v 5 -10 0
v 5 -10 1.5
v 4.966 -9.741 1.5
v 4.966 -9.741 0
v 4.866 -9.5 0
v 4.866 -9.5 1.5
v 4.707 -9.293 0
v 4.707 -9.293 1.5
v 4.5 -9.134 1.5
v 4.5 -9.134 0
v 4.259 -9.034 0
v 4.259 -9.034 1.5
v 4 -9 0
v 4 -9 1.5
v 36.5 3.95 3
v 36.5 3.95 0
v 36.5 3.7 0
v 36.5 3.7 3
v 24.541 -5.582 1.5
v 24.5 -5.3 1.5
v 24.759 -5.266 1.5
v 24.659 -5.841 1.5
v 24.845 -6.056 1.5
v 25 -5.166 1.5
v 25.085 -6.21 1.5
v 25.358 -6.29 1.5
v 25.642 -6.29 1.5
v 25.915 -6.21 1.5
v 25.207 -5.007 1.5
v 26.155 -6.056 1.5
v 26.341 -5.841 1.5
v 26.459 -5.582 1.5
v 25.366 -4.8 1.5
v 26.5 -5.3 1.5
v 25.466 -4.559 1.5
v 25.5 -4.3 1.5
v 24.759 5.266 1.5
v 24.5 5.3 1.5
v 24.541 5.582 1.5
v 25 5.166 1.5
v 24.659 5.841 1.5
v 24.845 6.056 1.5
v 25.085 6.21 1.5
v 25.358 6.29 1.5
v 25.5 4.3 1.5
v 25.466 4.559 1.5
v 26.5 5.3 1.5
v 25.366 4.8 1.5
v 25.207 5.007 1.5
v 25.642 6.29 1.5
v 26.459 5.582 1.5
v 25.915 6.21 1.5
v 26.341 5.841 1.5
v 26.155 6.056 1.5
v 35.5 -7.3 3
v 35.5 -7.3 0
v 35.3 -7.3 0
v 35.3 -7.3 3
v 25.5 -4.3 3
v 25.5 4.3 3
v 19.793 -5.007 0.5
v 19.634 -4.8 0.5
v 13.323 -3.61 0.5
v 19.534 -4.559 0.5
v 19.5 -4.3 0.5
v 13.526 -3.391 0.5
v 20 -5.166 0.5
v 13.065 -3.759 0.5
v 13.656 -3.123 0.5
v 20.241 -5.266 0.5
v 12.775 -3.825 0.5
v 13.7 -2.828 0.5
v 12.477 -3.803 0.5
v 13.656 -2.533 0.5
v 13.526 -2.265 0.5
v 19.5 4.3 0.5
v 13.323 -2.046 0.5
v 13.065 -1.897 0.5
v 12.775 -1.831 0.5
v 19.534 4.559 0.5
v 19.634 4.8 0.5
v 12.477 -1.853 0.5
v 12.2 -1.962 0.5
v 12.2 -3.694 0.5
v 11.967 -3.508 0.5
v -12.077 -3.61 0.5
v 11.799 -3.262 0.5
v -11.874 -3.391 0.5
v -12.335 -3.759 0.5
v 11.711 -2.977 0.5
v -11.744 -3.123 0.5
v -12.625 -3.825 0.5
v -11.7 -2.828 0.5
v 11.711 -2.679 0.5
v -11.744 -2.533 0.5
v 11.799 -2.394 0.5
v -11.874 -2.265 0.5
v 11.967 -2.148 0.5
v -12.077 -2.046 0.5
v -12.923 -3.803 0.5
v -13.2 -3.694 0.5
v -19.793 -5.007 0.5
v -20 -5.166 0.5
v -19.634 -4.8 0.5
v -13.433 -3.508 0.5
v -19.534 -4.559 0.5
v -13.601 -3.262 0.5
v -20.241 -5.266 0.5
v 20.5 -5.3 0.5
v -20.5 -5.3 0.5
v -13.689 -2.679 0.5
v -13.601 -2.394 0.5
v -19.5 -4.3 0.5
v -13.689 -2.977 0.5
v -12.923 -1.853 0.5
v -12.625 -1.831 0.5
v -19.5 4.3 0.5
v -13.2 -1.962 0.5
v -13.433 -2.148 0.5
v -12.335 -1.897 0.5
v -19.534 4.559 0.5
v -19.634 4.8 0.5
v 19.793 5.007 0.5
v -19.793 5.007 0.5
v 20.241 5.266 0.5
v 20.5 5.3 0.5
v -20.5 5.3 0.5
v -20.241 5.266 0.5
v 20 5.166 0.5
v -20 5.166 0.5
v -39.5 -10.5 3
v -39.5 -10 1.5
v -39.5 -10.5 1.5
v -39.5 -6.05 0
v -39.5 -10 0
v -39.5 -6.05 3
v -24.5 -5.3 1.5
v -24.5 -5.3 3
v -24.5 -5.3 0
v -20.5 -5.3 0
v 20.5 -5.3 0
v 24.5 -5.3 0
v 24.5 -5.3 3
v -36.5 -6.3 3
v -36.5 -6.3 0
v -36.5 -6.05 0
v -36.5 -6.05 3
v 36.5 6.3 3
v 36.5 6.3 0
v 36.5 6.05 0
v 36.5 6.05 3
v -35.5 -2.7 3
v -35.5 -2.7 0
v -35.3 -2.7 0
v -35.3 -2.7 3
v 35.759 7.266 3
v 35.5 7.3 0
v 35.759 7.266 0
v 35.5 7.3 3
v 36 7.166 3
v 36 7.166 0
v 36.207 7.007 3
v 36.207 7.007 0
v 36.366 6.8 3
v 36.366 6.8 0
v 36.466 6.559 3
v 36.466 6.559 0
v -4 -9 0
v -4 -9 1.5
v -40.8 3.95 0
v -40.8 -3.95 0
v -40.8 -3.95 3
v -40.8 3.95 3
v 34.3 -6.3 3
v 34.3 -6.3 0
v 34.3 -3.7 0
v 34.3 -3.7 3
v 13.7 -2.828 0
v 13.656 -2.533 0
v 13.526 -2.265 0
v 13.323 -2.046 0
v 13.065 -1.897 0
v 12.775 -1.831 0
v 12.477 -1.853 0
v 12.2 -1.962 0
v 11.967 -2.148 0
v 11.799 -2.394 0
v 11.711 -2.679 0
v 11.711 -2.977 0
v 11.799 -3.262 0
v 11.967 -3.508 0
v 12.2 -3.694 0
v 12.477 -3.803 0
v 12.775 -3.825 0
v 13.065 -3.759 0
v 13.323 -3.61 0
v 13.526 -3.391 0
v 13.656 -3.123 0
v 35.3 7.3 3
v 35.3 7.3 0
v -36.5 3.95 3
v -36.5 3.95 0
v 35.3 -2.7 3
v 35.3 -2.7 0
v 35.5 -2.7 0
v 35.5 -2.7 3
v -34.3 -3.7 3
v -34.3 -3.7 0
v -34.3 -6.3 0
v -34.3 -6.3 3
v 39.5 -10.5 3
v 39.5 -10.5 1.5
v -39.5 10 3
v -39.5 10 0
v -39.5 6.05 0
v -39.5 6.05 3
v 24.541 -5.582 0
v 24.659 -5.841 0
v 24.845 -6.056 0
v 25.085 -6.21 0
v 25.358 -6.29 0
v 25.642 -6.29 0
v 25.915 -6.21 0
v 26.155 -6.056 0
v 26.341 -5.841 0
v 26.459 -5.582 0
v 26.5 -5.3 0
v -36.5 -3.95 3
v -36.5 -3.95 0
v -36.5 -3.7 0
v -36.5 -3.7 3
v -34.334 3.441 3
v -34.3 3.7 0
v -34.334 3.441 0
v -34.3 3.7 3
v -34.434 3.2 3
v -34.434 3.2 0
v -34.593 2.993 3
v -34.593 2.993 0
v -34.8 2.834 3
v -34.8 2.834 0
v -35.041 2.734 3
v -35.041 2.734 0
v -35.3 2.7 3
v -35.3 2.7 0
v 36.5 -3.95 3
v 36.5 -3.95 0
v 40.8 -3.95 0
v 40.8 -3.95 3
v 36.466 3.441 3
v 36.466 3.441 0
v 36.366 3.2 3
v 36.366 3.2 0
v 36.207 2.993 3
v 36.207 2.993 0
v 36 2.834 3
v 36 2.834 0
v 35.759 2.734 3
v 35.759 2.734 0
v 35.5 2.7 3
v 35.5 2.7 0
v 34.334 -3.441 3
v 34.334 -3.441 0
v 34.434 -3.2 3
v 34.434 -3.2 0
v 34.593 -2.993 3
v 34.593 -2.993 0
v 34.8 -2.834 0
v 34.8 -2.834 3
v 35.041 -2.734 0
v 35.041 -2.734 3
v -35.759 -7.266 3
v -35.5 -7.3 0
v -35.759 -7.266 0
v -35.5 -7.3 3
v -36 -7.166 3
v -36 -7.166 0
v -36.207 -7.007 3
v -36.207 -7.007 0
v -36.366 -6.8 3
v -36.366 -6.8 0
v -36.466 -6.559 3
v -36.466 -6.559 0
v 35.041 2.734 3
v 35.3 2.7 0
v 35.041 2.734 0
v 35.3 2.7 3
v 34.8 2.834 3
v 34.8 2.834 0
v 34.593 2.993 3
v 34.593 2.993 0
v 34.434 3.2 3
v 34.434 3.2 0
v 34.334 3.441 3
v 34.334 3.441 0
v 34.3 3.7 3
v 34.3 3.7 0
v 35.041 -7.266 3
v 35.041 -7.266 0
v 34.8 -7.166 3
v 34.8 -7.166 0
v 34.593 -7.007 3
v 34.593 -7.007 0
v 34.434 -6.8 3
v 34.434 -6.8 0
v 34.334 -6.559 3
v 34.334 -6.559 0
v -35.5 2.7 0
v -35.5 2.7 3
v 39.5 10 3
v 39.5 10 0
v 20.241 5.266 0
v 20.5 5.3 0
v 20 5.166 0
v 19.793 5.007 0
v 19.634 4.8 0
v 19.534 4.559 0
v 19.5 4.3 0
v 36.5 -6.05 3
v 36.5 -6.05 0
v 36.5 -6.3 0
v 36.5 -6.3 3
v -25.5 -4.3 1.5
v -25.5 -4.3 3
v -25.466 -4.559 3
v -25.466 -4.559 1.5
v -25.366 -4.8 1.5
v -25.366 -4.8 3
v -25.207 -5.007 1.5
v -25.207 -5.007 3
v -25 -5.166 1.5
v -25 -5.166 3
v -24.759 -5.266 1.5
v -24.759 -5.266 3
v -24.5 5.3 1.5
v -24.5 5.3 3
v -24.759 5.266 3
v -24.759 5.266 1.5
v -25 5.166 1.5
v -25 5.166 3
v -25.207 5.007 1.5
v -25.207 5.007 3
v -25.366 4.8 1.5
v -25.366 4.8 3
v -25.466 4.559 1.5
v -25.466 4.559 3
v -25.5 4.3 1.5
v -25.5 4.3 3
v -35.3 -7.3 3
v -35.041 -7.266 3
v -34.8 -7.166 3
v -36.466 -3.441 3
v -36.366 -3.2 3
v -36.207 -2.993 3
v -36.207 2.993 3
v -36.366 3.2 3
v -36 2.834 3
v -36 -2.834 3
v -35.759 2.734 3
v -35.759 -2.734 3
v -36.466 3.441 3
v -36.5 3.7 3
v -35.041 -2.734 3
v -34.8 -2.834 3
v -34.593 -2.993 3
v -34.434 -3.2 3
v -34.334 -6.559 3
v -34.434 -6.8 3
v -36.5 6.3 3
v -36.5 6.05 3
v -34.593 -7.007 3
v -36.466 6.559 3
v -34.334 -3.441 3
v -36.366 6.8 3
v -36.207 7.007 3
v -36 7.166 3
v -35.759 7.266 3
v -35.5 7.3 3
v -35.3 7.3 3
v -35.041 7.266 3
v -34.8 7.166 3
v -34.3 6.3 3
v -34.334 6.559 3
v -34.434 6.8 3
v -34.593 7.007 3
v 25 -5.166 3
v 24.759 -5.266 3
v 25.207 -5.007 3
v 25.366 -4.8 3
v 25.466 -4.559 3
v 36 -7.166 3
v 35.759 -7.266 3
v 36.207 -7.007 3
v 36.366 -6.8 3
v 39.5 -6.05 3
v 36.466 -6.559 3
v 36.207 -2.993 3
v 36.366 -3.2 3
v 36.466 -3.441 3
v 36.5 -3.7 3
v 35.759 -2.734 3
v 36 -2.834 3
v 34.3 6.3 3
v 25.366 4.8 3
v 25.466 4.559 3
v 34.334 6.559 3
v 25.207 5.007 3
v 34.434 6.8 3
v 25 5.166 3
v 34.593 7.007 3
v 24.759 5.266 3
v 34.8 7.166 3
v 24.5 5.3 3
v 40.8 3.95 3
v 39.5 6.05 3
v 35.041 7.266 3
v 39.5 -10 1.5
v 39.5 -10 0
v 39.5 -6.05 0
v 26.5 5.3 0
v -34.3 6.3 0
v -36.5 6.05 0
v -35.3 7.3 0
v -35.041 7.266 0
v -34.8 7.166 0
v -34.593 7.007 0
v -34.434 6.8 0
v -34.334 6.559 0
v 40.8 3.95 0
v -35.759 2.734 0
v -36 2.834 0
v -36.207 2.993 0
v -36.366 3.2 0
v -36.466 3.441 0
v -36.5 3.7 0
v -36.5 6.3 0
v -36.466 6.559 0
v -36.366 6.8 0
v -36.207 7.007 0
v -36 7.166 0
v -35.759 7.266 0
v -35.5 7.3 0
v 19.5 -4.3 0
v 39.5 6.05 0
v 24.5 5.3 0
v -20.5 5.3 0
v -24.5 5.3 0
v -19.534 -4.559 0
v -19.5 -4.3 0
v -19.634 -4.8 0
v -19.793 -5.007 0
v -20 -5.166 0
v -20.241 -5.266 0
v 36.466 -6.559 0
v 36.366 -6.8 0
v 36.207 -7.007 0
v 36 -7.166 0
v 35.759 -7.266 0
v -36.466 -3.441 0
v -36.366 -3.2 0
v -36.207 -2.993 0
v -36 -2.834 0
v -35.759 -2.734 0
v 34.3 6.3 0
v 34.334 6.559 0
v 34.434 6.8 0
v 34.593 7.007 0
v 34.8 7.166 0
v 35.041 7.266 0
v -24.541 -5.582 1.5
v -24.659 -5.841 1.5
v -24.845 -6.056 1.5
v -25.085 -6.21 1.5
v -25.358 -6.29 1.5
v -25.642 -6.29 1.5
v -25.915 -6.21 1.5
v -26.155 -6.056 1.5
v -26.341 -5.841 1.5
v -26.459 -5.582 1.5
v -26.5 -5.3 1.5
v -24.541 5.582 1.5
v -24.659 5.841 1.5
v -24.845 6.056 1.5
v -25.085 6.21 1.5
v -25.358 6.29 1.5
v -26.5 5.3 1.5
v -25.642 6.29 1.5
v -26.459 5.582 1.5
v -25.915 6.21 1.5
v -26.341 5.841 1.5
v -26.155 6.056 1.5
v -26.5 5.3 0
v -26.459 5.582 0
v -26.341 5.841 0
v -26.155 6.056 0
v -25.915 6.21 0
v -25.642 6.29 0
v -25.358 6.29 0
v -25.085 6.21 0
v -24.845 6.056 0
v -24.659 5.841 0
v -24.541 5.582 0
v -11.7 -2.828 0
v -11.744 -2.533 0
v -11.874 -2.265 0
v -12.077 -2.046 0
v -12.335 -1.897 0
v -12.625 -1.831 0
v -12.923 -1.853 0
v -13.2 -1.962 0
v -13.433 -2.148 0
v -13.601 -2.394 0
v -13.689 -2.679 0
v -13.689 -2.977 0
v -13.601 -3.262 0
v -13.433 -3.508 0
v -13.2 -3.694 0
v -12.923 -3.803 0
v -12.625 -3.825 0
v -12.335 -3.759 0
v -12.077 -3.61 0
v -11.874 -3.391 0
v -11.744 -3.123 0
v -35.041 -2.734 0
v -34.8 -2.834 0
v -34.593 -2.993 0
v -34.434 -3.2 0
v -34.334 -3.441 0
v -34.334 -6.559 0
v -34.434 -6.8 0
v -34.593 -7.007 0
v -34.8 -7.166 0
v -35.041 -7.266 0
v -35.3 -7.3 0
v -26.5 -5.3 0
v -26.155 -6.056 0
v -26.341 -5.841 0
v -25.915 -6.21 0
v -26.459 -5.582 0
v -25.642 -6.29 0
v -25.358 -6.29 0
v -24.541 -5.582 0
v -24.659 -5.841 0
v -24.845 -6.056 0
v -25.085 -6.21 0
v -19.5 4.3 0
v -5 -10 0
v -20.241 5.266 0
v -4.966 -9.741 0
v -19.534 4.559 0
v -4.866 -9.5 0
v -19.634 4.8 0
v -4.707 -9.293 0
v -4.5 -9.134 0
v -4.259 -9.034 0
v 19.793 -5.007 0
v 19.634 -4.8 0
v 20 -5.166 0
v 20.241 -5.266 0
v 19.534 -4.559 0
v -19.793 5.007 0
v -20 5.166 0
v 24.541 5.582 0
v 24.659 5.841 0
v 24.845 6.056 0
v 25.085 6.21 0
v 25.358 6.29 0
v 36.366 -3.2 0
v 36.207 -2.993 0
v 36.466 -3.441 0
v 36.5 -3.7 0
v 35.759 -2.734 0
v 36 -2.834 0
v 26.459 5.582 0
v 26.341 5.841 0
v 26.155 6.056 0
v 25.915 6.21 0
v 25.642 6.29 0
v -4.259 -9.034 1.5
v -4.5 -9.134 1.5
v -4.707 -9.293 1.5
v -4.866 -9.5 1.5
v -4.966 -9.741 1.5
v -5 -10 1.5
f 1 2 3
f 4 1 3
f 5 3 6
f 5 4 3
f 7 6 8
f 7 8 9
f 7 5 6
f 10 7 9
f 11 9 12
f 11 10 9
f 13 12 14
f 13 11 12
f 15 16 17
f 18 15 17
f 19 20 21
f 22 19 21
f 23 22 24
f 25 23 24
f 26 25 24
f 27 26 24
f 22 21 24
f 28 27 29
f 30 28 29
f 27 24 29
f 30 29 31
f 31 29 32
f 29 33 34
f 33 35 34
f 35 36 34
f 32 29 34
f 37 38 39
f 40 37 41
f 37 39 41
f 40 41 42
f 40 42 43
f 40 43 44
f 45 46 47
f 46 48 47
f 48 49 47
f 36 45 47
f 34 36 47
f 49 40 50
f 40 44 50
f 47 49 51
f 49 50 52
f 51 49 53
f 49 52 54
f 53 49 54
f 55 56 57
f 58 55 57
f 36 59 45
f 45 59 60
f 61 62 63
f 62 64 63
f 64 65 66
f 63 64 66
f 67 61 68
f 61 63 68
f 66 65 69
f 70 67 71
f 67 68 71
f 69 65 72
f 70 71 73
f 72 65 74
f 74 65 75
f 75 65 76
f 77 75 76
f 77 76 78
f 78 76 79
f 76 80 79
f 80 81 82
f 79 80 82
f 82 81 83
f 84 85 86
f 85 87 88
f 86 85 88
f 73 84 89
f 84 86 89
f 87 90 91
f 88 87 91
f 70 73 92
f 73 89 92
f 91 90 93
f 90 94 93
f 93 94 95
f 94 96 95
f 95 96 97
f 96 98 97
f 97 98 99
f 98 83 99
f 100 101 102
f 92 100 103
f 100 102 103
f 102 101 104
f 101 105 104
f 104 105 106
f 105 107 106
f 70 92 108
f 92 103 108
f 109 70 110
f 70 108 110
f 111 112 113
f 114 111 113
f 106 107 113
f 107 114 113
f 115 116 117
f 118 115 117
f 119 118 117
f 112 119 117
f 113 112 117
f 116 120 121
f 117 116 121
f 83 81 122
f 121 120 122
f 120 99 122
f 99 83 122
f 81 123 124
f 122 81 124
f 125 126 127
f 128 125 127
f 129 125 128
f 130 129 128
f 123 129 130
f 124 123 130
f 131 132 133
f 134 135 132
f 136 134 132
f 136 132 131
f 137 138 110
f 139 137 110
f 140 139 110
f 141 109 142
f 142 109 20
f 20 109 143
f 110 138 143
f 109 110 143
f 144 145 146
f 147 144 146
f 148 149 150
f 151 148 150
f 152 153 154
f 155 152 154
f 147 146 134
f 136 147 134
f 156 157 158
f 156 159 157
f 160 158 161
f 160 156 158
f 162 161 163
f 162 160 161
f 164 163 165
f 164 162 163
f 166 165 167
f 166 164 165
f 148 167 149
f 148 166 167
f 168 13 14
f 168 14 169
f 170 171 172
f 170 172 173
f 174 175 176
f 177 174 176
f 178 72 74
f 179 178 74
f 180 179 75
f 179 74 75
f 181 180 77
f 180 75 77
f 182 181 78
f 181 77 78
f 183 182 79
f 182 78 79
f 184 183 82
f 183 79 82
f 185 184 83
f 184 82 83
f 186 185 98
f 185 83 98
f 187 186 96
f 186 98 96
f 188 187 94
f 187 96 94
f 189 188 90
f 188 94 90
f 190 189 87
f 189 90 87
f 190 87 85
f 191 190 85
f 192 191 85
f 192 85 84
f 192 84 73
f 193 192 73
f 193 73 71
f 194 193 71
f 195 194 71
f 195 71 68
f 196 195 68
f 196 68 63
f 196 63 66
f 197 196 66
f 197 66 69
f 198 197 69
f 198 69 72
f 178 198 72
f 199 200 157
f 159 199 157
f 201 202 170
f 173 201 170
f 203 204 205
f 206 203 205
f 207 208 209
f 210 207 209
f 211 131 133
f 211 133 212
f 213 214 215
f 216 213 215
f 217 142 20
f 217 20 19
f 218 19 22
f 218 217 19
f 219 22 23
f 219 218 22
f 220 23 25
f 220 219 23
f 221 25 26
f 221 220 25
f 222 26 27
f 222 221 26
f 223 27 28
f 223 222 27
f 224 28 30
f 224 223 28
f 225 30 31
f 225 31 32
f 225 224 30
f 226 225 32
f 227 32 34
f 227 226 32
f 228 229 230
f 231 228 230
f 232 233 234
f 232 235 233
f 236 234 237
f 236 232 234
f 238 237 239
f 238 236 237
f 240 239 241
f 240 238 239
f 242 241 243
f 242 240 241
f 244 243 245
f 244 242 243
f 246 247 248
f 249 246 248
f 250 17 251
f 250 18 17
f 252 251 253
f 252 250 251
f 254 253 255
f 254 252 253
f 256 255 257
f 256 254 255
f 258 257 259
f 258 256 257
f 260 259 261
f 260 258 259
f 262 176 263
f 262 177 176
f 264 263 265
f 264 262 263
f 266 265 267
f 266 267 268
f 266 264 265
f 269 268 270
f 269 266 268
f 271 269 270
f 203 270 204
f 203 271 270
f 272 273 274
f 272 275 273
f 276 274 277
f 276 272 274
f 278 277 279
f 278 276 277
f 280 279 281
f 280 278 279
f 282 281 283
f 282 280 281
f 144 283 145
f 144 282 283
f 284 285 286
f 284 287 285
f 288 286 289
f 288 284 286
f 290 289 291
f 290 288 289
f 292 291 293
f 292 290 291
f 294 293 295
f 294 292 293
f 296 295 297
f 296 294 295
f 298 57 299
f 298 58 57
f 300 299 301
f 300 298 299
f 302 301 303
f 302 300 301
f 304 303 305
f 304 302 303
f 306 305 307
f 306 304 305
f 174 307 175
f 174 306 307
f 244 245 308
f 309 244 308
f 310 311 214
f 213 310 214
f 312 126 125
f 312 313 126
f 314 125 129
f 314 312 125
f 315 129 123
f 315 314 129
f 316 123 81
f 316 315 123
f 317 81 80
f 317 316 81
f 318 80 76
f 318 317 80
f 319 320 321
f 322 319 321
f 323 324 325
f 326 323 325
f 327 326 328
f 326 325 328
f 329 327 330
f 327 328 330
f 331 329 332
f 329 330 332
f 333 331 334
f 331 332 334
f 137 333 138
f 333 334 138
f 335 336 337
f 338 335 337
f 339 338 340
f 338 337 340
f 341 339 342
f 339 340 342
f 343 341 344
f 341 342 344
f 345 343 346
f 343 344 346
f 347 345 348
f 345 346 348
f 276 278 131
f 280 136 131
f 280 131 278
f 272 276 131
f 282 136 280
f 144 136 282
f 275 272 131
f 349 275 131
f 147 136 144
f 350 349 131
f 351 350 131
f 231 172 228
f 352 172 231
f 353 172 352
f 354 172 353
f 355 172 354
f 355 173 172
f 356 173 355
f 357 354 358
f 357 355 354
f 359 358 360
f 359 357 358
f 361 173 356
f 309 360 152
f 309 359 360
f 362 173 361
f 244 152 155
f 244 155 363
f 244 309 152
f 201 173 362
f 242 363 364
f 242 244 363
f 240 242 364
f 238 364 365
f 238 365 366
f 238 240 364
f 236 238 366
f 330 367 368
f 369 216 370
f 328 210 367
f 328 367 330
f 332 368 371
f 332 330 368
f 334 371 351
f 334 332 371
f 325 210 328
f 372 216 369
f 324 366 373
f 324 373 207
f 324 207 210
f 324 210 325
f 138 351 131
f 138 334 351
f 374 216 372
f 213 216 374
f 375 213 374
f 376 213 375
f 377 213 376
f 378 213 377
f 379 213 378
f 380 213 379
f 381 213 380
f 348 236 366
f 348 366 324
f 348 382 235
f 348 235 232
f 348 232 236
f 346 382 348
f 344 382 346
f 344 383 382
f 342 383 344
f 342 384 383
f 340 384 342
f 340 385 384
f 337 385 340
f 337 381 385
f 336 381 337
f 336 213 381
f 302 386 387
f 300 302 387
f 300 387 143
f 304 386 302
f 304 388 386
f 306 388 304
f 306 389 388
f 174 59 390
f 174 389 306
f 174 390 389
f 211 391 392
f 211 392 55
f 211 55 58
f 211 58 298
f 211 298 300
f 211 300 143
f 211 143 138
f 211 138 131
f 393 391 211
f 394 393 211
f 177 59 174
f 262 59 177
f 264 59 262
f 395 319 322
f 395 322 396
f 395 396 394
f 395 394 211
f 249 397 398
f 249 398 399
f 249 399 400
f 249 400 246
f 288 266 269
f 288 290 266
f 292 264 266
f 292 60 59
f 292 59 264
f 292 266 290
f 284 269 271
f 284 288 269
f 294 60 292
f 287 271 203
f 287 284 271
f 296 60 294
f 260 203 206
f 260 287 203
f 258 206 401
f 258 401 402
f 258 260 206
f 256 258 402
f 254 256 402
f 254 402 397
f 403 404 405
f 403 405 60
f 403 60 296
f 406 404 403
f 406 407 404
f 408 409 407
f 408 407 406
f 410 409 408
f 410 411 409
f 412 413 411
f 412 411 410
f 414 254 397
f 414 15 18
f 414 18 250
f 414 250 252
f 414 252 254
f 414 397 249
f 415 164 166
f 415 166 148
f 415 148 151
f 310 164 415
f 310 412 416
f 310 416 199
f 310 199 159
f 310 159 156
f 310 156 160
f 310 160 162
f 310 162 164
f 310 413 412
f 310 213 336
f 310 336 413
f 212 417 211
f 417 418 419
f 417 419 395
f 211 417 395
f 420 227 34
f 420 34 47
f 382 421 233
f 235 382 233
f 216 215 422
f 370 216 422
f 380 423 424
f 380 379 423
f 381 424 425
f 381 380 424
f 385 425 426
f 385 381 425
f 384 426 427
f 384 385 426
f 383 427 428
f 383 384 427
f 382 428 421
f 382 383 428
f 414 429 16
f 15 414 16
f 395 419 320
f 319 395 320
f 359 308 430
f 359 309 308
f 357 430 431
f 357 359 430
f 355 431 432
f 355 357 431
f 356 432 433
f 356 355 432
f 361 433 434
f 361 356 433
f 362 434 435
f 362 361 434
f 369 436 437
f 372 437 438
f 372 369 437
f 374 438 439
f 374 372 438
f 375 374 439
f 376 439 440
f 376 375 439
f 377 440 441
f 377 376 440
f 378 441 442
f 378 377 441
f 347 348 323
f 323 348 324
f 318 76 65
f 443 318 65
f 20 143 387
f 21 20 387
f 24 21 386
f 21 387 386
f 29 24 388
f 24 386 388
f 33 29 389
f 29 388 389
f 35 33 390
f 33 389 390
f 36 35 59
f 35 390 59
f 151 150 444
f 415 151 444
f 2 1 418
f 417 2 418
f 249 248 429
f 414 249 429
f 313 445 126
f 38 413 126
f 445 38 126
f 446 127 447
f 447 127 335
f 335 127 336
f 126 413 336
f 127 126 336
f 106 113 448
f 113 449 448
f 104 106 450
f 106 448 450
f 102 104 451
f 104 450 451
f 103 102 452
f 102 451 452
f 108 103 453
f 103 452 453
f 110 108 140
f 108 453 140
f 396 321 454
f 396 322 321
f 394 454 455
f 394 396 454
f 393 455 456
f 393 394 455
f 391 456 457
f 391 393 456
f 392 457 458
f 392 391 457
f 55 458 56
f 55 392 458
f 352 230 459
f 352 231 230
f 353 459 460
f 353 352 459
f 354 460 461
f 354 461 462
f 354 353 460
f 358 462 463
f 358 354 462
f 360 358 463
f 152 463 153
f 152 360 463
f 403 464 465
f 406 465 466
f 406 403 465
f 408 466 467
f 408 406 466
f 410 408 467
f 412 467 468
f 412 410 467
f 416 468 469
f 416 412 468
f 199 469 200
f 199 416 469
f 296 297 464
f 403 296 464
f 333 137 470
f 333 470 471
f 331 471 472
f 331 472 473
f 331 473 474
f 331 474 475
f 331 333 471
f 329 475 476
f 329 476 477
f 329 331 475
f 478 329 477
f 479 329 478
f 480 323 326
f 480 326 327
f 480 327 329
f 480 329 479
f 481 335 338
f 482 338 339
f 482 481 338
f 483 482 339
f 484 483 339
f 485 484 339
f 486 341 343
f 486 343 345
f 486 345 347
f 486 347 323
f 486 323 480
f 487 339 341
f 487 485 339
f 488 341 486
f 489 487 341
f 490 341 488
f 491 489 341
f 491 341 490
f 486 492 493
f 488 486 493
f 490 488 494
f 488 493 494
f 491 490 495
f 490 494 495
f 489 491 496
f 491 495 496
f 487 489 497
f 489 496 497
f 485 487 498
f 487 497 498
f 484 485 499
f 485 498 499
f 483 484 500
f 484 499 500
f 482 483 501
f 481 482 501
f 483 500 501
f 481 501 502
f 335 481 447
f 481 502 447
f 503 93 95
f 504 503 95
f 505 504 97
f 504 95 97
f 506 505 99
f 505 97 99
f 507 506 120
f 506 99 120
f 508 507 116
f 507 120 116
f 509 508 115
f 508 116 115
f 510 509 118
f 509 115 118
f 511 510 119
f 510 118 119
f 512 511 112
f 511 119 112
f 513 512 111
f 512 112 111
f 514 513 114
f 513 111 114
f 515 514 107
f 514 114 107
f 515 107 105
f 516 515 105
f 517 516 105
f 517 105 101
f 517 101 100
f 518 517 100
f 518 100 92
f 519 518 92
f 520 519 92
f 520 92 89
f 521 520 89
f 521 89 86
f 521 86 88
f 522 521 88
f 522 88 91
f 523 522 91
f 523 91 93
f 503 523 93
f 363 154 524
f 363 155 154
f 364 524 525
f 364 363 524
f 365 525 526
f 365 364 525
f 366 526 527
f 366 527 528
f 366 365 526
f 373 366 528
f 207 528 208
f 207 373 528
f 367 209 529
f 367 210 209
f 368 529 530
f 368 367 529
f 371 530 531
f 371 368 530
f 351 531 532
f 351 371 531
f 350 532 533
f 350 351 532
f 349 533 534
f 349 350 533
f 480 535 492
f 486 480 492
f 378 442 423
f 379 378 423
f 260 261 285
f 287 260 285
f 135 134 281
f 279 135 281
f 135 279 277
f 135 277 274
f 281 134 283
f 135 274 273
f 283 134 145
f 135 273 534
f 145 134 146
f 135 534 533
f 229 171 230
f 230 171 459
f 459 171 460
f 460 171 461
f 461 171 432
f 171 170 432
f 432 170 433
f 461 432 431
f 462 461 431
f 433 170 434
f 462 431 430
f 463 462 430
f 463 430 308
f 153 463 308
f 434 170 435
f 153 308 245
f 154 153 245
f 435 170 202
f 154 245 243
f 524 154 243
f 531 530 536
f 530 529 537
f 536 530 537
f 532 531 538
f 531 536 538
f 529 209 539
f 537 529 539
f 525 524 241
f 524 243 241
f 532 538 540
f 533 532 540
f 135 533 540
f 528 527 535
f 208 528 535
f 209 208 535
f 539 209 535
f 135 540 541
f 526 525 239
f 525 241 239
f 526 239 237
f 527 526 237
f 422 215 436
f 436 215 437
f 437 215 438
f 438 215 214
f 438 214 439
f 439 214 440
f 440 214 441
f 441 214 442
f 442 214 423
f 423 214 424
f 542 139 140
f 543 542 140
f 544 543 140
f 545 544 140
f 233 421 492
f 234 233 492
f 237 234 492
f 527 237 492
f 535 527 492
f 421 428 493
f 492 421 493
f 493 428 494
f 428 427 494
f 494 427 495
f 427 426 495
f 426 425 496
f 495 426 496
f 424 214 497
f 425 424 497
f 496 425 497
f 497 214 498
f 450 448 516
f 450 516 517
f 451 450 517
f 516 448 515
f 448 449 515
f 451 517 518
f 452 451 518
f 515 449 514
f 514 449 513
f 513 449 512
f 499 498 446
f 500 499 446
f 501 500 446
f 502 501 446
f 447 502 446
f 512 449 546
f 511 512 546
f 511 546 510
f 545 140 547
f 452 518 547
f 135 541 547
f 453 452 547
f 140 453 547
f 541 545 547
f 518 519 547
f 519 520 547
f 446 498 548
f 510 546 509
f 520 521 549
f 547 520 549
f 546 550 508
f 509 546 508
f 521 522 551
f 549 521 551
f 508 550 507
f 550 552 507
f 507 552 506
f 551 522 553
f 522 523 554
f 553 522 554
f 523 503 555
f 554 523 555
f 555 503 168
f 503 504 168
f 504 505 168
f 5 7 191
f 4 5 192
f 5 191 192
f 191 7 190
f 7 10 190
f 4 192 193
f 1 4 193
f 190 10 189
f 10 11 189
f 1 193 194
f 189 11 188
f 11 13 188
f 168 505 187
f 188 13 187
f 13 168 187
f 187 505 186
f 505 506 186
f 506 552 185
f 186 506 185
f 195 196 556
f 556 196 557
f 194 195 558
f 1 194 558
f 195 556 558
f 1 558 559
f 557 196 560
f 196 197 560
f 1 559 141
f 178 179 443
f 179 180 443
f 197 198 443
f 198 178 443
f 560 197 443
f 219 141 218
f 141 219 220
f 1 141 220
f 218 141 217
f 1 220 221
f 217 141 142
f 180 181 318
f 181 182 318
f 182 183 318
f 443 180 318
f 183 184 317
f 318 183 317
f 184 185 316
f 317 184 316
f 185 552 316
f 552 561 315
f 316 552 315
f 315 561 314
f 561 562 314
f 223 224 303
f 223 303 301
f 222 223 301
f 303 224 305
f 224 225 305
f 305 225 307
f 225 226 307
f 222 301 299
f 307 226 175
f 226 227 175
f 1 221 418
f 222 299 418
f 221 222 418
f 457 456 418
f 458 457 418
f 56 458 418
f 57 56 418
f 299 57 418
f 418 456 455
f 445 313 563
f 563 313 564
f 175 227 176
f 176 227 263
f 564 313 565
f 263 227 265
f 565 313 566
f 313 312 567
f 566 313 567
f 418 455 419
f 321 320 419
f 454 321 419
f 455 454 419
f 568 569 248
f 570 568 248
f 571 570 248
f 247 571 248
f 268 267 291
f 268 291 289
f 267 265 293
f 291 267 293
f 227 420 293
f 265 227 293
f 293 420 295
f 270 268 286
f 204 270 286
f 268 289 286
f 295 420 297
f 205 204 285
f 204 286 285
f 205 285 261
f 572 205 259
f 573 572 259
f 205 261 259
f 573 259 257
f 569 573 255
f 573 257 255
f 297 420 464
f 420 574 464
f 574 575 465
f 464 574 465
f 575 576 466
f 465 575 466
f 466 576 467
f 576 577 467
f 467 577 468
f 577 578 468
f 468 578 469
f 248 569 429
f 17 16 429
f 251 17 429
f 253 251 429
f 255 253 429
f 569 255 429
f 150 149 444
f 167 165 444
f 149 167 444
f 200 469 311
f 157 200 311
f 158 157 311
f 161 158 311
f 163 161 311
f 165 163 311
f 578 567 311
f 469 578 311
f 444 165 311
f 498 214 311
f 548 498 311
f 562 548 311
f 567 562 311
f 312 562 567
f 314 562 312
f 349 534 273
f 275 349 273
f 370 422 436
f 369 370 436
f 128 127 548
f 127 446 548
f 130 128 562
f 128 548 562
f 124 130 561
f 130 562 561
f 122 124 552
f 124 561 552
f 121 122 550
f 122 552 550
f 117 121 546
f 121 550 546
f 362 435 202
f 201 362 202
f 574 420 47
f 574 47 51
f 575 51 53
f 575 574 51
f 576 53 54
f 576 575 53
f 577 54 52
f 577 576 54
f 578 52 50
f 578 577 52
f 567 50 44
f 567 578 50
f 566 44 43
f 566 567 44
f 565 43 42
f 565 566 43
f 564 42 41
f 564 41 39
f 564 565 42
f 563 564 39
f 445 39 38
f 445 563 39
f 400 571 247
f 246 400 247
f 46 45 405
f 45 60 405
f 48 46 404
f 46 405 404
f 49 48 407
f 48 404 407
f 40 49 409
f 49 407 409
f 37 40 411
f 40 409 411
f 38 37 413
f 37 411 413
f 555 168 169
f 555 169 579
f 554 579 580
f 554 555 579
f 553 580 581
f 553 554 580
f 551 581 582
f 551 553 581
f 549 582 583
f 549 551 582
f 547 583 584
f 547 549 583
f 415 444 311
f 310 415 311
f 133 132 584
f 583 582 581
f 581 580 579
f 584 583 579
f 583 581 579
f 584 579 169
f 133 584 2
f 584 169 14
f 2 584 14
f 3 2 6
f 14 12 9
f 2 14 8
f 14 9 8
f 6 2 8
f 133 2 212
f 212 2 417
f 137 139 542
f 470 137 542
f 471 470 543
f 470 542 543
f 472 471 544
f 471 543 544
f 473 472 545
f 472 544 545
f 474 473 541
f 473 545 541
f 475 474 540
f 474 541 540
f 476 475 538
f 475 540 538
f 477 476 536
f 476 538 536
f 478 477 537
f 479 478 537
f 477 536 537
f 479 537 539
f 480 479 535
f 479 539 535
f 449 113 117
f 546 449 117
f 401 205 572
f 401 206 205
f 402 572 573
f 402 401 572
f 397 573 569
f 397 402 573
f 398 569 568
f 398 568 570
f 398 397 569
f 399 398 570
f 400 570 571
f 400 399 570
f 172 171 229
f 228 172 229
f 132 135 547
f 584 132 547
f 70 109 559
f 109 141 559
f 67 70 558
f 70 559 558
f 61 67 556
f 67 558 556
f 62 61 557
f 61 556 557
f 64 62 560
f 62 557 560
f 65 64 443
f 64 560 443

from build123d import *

# Parameters (mm, degrees)
SKETCH1_W                          = 1.3
SKETCH1_H                          = 7.9
BASE_SHAPE_DEPTH                   = 3
SKETCH4_W                          = 79
SKETCH4_H                          = 1.5
FLOOR_LIP_DEPTH                    = 0.5
NAIL_CUTOUT_DEPTH                  = 1.5
MILL_FILLETS_R                     = 1
LED_STRIP_POCKET_DEPTH             = 2.5
LED_STRIP_CUTS_REACH               = 2.5
SKETCH9_R                          = 1
LED_STRIP_CUT_FILLETS_R            = 1
LED_PCB_PADS_CLEARANCE_SLOTS_DEPTH = 1.5


with BuildPart() as part:
    # Sketch1 → Base shape (new body)
    with BuildSketch(Plane.XY):
        Polygon((39.5, 10), (-39.5, 10), (-39.5, 6.05), (-36.5, 6.05), (-36.5, 7.3), (-34.3, 7.3), (-34.3, 2.7), (-36.5, 2.7), (-36.5, 3.95), (-39.5, 3.95), (-39.5, -3.95), (-36.5, -3.95), (-36.5, -2.7), (-34.3, -2.7), (-34.3, -7.3), (-36.5, -7.3), (-36.5, -6.05), (-39.5, -6.05), (-39.5, -10), (39.5, -10), (39.5, -6.05), (36.5, -6.05), (36.5, -7.3), (34.3, -7.3), (34.3, -2.7), (36.5, -2.7), (36.5, -3.95), (39.5, -3.95), (39.5, 3.95), (36.5, 3.95), (36.5, 2.7), (34.3, 2.7), (34.3, 7.3), (36.5, 7.3), (36.5, 6.05), (39.5, 6.05), align=None)
        with Locations((-40.15, 0)):
            Rectangle(SKETCH1_W, SKETCH1_H)
        with Locations((40.15, 0)):
            Rectangle(SKETCH1_W, SKETCH1_H)
    extrude(amount=BASE_SHAPE_DEPTH)

    # Sketch4 → Floor lip (add)
    with BuildSketch(Plane.XZ.offset(10)):
        with Locations((0, 2.25)):
            Rectangle(SKETCH4_W, SKETCH4_H)
    extrude(amount=FLOOR_LIP_DEPTH)

    # Sketch6 → Nail cutout (cut)
    with BuildSketch(Plane(origin=(0, 0, 0), x_dir=(-1, 0, 0), z_dir=(0, 0, -1))):
        with BuildLine():
            Line((-4, -9), (4, -9))
            ThreePointArc((4, -9), (5, -10), (4, -11))
            Line((4, -11), (-4, -11))
            ThreePointArc((-4, -11), (-5, -10), (-4, -9))
        make_face()
    extrude(amount=-NAIL_CUTOUT_DEPTH, mode=Mode.SUBTRACT)

    # Mill fillets
    mill_fillets_edges = [part.edges().sort_by_distance(p)[0] for p in [
        (36.5, -2.7, 1.5),
        (34.3, -2.7, 1.5),
        (34.3, -7.3, 1.5),
        (36.5, -7.3, 1.5),
        (-36.5, -7.3, 1.5),
        (-34.3, -7.3, 1.5),
        (-34.3, -2.7, 1.5),
        (-36.5, -2.7, 1.5),
        (-36.5, 2.7, 1.5),
        (-34.3, 2.7, 1.5),
        (-34.3, 7.3, 1.5),
        (-36.5, 7.3, 1.5),
        (36.5, 7.3, 1.5),
        (34.3, 7.3, 1.5),
        (34.3, 2.7, 1.5),
        (36.5, 2.7, 1.5),
    ]]
    fillet(mill_fillets_edges, radius=MILL_FILLETS_R)

    # Sketch8 → Led strip pocket (cut)
    with BuildSketch(Plane.XY.offset(3)):
        with BuildLine():
            Line((-24.5, 5.3), (24.5, 5.3))
            ThreePointArc((24.5, 5.3), (25.207106781, 5.007106781), (25.5, 4.3))
            Line((25.5, 4.3), (25.5, -4.3))
            ThreePointArc((25.5, -4.3), (25.207106781, -5.007106781), (24.5, -5.3))
            Line((24.5, -5.3), (-24.5, -5.3))
            ThreePointArc((-24.5, -5.3), (-25.207106781, -5.007106781), (-25.5, -4.3))
            Line((-25.5, -4.3), (-25.5, 4.3))
            ThreePointArc((-25.5, 4.3), (-25.207106781, 5.007106781), (-24.5, 5.3))
        make_face()
    extrude(amount=-LED_STRIP_POCKET_DEPTH, mode=Mode.SUBTRACT)

    # Sketch9 → Led strip cuts (cut, up to next)
    with BuildSketch(Plane.XY.offset(0.5), mode=Mode.PRIVATE) as led_strip_cuts_sk1:
        with BuildLine():
            Line((-19.5, -5.3), (-19.5, 5.3))
            Line((-19.5, 5.3), (-24.5, 5.3))
            ThreePointArc((-24.5, 5.3), (-25.207106781, 5.007106781), (-25.5, 4.3))
            Line((-25.5, 4.3), (-25.5, -4.3))
            ThreePointArc((-25.5, -4.3), (-25.207106781, -5.007106781), (-24.5, -5.3))
            Line((-24.5, -5.3), (-19.5, -5.3))
        make_face()
    led_strip_cuts_tool1 = extrude(led_strip_cuts_sk1.sketch, amount=-LED_STRIP_CUTS_REACH, mode=Mode.PRIVATE) & part.part
    add(led_strip_cuts_tool1.solids().sort_by_distance((-22.481135, 0, 0.5))[0], mode=Mode.SUBTRACT)
    # Sketch9 → Led strip cuts (cut, up to next)
    with BuildSketch(Plane.XY.offset(0.5), mode=Mode.PRIVATE) as led_strip_cuts_sk2:
        with BuildLine():
            Line((24.5, 5.3), (19.5, 5.3))
            Line((19.5, 5.3), (19.5, -5.3))
            Line((19.5, -5.3), (24.5, -5.3))
            ThreePointArc((24.5, -5.3), (25.207106781, -5.007106781), (25.5, -4.3))
            Line((25.5, -4.3), (25.5, 4.3))
            ThreePointArc((25.5, 4.3), (25.207106781, 5.007106781), (24.5, 5.3))
        make_face()
    led_strip_cuts_tool2 = extrude(led_strip_cuts_sk2.sketch, amount=-LED_STRIP_CUTS_REACH, mode=Mode.PRIVATE) & part.part
    add(led_strip_cuts_tool2.solids().sort_by_distance((22.481135, 0, 0.5))[0], mode=Mode.SUBTRACT)
    # Sketch9 → Led strip cuts (cut, up to next)
    with BuildSketch(Plane.XY.offset(0.5), mode=Mode.PRIVATE) as led_strip_cuts_sk3:
        with Locations((-12.7, -2.828)):
            Circle(SKETCH9_R)
    led_strip_cuts_tool3 = extrude(led_strip_cuts_sk3.sketch, amount=-LED_STRIP_CUTS_REACH, mode=Mode.PRIVATE) & part.part
    add(led_strip_cuts_tool3.solids().sort_by_distance((-12.7, -2.828, 0.5))[0], mode=Mode.SUBTRACT)
    # Sketch9 → Led strip cuts (cut, up to next)
    with BuildSketch(Plane.XY.offset(0.5), mode=Mode.PRIVATE) as led_strip_cuts_sk4:
        with Locations((12.7, -2.828)):
            Circle(SKETCH9_R)
    led_strip_cuts_tool4 = extrude(led_strip_cuts_sk4.sketch, amount=-LED_STRIP_CUTS_REACH, mode=Mode.PRIVATE) & part.part
    add(led_strip_cuts_tool4.solids().sort_by_distance((12.7, -2.828, 0.5))[0], mode=Mode.SUBTRACT)

    # Led strip cut fillets
    led_strip_cut_fillets_edges = [part.edges().sort_by_distance(p)[0] for p in [
        (-19.5, 5.3, 0.25),
        (-19.5, -5.3, 0.25),
        (19.5, 5.3, 0.25),
        (19.5, -5.3, 0.25),
    ]]
    fillet(led_strip_cut_fillets_edges, radius=LED_STRIP_CUT_FILLETS_R)

    # Sketch23 → LED PCB pads clearance slots (cut)
    with BuildSketch(Plane(origin=(0, 0, 0), x_dir=(-1, 0, 0), z_dir=(0, 0, -1))):
        with BuildLine():
            Line((-26.5, -5.3), (-26.5, 5.3))
            ThreePointArc((-26.5, 5.3), (-25.5, 6.3), (-24.5, 5.3))
            Line((-24.5, 5.3), (-24.5, -5.3))
            ThreePointArc((-24.5, -5.3), (-25.5, -6.3), (-26.5, -5.3))
        make_face()
        with BuildLine():
            Line((26.5, -5.3), (26.5, 5.3))
            ThreePointArc((26.5, 5.3), (25.5, 6.3), (24.5, 5.3))
            Line((24.5, 5.3), (24.5, -5.3))
            ThreePointArc((24.5, -5.3), (25.5, -6.3), (26.5, -5.3))
        make_face()
    extrude(amount=-LED_PCB_PADS_CLEARANCE_SLOTS_DEPTH, mode=Mode.SUBTRACT)


solid = part.part
